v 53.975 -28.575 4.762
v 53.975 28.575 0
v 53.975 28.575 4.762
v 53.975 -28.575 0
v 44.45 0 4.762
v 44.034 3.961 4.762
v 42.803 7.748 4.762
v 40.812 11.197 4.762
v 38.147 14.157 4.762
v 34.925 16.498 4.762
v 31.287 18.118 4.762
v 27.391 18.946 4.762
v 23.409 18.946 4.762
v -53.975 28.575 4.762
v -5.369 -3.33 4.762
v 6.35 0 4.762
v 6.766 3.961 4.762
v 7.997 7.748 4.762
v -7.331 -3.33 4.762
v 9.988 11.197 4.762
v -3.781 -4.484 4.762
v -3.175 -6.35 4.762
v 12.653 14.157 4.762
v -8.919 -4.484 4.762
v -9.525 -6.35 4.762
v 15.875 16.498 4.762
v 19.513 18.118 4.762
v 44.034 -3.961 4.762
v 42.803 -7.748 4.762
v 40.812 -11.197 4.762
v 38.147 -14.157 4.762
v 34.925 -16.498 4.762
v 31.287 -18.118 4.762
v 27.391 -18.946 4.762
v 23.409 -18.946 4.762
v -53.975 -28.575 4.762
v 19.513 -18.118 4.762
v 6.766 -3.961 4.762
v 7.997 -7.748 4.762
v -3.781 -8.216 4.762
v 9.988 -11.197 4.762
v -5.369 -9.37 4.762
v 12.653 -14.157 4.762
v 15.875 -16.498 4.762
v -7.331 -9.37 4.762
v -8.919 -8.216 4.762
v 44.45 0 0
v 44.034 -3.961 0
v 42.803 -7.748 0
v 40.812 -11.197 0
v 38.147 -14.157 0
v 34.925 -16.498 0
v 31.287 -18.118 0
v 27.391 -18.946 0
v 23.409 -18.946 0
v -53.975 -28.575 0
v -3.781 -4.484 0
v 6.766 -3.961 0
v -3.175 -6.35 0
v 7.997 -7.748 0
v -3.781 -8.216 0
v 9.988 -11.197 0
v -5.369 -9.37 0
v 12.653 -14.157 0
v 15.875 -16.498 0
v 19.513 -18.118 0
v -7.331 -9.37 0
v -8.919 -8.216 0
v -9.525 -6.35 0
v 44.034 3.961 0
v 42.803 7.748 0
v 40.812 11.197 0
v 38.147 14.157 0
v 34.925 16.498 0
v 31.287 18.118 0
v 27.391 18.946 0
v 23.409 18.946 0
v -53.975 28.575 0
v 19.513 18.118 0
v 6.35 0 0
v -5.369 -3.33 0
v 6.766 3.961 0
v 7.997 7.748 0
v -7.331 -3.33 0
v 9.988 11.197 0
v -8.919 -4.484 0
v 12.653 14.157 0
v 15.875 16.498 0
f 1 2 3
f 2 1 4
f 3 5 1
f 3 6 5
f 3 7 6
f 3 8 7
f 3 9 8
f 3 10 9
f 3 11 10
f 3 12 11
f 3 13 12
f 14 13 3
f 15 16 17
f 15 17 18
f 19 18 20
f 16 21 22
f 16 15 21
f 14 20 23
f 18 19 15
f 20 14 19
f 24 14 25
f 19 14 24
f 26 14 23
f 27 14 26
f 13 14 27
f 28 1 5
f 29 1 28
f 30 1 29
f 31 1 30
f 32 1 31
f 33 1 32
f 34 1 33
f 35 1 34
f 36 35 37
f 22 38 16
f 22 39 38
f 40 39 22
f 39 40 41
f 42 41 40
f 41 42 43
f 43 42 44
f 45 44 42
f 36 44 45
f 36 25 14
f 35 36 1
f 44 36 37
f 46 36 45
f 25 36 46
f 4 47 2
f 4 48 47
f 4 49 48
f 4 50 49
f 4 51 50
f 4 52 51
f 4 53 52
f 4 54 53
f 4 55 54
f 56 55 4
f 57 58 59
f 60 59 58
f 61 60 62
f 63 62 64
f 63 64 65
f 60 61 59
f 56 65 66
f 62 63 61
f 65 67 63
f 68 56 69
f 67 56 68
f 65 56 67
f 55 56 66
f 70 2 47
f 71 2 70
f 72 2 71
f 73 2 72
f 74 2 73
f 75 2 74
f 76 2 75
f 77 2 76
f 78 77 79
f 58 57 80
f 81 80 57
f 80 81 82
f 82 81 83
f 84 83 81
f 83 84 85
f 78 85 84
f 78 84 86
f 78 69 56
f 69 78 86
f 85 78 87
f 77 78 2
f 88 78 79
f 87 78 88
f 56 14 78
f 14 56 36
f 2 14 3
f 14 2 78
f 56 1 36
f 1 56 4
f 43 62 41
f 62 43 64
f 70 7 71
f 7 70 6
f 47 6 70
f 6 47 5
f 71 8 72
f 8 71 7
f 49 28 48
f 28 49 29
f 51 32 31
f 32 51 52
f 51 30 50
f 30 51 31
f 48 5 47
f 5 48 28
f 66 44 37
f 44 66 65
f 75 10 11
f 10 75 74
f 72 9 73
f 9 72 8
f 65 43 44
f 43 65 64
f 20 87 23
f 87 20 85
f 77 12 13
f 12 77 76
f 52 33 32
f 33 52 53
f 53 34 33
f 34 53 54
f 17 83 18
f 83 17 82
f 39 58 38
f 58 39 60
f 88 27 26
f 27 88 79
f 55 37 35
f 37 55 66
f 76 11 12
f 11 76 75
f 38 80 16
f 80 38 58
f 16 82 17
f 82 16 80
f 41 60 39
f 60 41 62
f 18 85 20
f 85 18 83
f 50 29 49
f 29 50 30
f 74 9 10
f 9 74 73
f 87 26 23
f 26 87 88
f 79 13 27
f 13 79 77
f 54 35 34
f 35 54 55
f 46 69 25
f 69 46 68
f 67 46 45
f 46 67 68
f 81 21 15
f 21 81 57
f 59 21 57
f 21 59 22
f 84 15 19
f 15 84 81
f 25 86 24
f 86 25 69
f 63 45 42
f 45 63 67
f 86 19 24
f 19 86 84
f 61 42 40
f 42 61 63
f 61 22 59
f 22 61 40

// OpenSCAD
// file: measure_imperial.scad
function i2m(x)=x*25.4;

//Taps
rad_1032 = i2m(0.175 / 2);
rad_1420 = i2m(0.25 / 2);

// Gantry Tube
part_GantryTube = [i2m(3), i2m(24), i2m(1.5)];
dim_GantryTubeWall = i2m(0.125);
dim_GantryTubeHoleOffsetZ = i2m(0.75);
rad_GantryTubeHoleZ = i2m(0.5 / 2);
dim_GantryTubeHoleZEndY = i2m(2.25);
dim_GantryTubeHoleZOffsetY = i2m(3.25);
dim_GantryTubeTopHoleOffsetY = i2m(12.75);
dim_GantryTubeTopHoleOffsetX = i2m(0.375);
rad_GantryTubeTopHole = i2m(0.3125 / 2);
rad_GantryTubeMountHole = i2m(0.3125 / 2);
dim_GantryTubeMountHoleOffsetY = i2m(0.375);
dim_GantryTubeMountHoleOffsetX = i2m(0.4375);
dim_GantryTubeMountHoleGapX = i2m(2.125);
rad_GantryTubeAdjacentHole = i2m(0.375 / 2);
dim_GantryTubeAdjacentHoleOffsetY = i2m(0.375);
dim_GantryTubeAdjacentHoleOffsetX = i2m(0.4375 + 0.875);

// Common Gantry Parts
part_GantryPart1 = [i2m(7.375), i2m(0.75), i2m(0.75)];
dim_GantryPart1AdjTapHoleX = i2m(0.375);
rad_GantryPart1AdjHoles = i2m(0.375 / 2);
dim_GantryPart1AdjHolesX = i2m(0.375);
dim_GantryPart1VertHole1X = i2m(3.125);
dim_GantryPart1VertHolesY = i2m(0.375);
dim_GantryPart1VertHole2X = i2m(3.125 + 2.125);

// Gantry Bottom
rad_GantryBottomVertHoles = i2m(0.3125 / 2);

// Gantry Left Top
rad_GantryLTopMountHole = i2m( 0.250 / 2);
dim_GantryLTopCentralHoleX = i2m(4.0);

// Gantry Right Top
rad_GantryRTopBore = i2m(0.375 / 2);
dim_GantryRTopBoreX = i2m(1.25);
dim_GantryRTopTapX1 = i2m(1.875);
dim_GantryRTopTapX2 = i2m(1.875 + 3.75);
rad_GantryRTopSmall = i2m(0.25 / 2);
dim_GantryRTopSmallX1 = i2m(1.875 + 1);
dim_GantryRTopSmallX2 = i2m(1.875 + 1 + 2);

// Gantry Spacer
part_GantrySpacer = [i2m(5.625), i2m(0.75), i2m(0.125)];
rad_GantrySpacerBig = i2m(0.3125 / 2);
rad_GantrySpacerSmall = i2m(0.25 / 2);
dim_GantrySpacerBigX1 = i2m( 1 );
dim_GantrySpacerBigX2 = i2m( 1 + 3.75);
dim_GantrySpacerSmallX1 = i2m( 1 + 1);
dim_GantrySpacerSmallX2 = i2m( 1 + 1 + 2);

// Gantry Outer Right
part_GantryOuterRight = [i2m(5.625), i2m(1), i2m(0.75)];
rad_GantryOuterRightHole = i2m(0.375 / 2);
dim_GantryOuterRightHole = i2m(0.375);
rad_GantryOuterRCapsule = i2m(0.3125 / 2);
dim_GantryOuterRCapsuleX1 = i2m(2);
dim_GantryOuterRCapsuleX2 = i2m(2 + 2);
dim_GantryOuterRCapsuleLen = i2m(0.25);
dim_GantryOuterRCapsuleY = i2m(0.375);
dim_GantryOuterRCenterX1 = i2m(2.625);
dim_GantryOuterRCenterX2 = i2m(2.625 + 0.75);
rad_GantryOuterROuter = i2m(0.3125 / 2);
dim_GantryOuterROuterX1 = i2m(1);
dim_GantryOuterROuterX2 = i2m(1 + 3.75);

// Y Motor Mount Comn
part_YMotorMount = [ i2m(2.25), i2m(0.75), i2m(1.25)];
rad_YMotorMountFillet = i2m( 0.125 );
dim_YMotorMountFilletX = i2m( 0.375);
dim_YMotorMountFilletZ = i2m( 0.75);
dim_YMotorMountBoltX = i2m(0.625);
dim_YMotorMountTapY = i2m(0.303);
dim_YMotorMountTapX1 = i2m(0.1875);
dim_YMotorMountTapX2 = i2m(0.1875 + 1.856);


// X Belt Plate
part_XBeltPlate = [ i2m(1.25), i2m(1.875), i2m(0.375)];
rad_XBeltPlateBore = i2m(0.3125 / 2);
dim_XBeltPlateBoreX1 = i2m(0.25);
dim_XBeltPlateBoreX2 = i2m(0.25 + 0.75);
dim_XBeltPlateBoreY = i2m(0.625 + 0.875);
dim_XBeltPlateTapY = i2m(0.625);

// X Belt Clamp
part_XBeltClamp = [ i2m(1.25), i2m(1), i2m(0.375)];
rad_XBeltClampBore = i2m(0.3125 / 2);
dim_XBeltClampBoreY = i2m(0.625);
dim_XBeltClampChamferY = i2m(0.062);

// Timing Belt
dim_TimingBeltPeriod = i2m(0.094);
dim_TimingBeltFreq = i2m(0.20);
dim_TimingBeltAmp = i2m(0.063);

// Y Rail
part_YRail = [ i2m(22.5), i2m(2.5), i2m(0.25) ];
dim_YRailYStart = i2m(1.5);
dim_YRailYOffset = i2m(3.25);

// Carriage Block Rear Upper
part_CarriageBlockRU = [i2m(6.75), i2m(0.75), i2m(0.75)];
part_CarriageBlockRUTapX = i2m(0.375);
rad_CarriageBlockRULower = i2m(0.375 / 2);
part_CarriageBlockRULowerX = i2m(0.875);
part_CarriageBlockRULowerY = i2m(0.393);
part_CarriageBlockRUUpperY = i2m(0.25);
part_CarriageBlockRUUpperX1 = i2m(2.9375);
part_CarriageBlockRUUpperX2 = i2m(2.9375 + 0.875);
rad_CarriageBlockRU = i2m(0.375 / 2);
part_CarriageBlockRUMiddleX = i2m(1.6875);

// Carriage Block Rear Lower
part_CarriageBlockRL = [i2m(6.75), i2m(1.25), i2m(0.75)];
rad_CarriageBlockRLFillet = i2m(0.125);
part_CarriageBlockRLFilletX = i2m(1.313);
part_CarriageBlockRLFilletY = i2m(0.50);
rad_CarriageBlockRLBigHoles = i2m(0.375 / 2);
rad_CarriageBlockRLSmallHoles = i2m(0.1875 / 2);
part_CarriageBlockRLEdgeOffset = i2m(0.375);
part_CarriageBlockRLTopHoleX = i2m(1.688 - 0.188);
part_CarriageBlockRLTopHoleY = i2m(0.438);
part_CarriageBlockRLTopHoleInX = i2m(1.688 + 0.188);
part_CarriageBlockRLTopTapX = i2m(0.875);
part_CarriageBlockRLTopTapY = i2m( 0.5 + 0.375);
part_CarriageBlockRLMiddleHoleX = i2m(1.688);
part_CarriageBlockRLMiddleTapX = i2m(2.9375);
part_CarriageBlockRLMiddleTapY = i2m(0.25);


// Bearing Block
part_BearingBlock = [i2m(0.75), i2m(1), i2m(1.75)];
rad_BearingBlockBigHoles = i2m(0.375 / 2);
rad_BearingBlockSmallHoles = i2m(0.3125 / 2);
dim_BearingBlockTop = i2m(0.25);
dim_BearingBlockSideY = i2m(0.25);
dim_BearingBlockSideZ1 = i2m(0.4375);
dim_BearingBlockSideZ2 = i2m(0.4375 + 0.875);
dim_BearingBlockBackX = i2m(0.25);
dim_BearingBlockBackZ = i2m(0.1875);

// Bearing Block Tapped
dim_BearingBlockTappedBackZ = i2m(0.1875 + 0.6875);

// Carriage Block Front Right
part_CarriageBlockFrontRight = [i2m(8.5), i2m(0.75), i2m(0.75)];
rad_CarriageBlockFR = i2m(0.375 / 2);
rad_CarriageBlockFRSmall = i2m(0.3125 / 2);
dim_CarriageBlockFREdge = i2m(0.375);
dim_CarriageBlockFREdgeX = i2m(0.8125);
dim_CarriageBlockFREdgeX2 = i2m(0.8125 + 5.625);
dim_CarriageBlockFRSmallEdgeX1 = i2m(0.25);
dim_CarriageBlockFRSmallEdgeX2 = i2m(0.25 + 0.50);
dim_CarriageBlockFRTapEdgeX1 = i2m(3.438);
dim_CarriageBlockFRTapEdgeX2 = i2m(3.438 + 0.875);
dim_CarriageBlockFRTapEdgeY = i2m(0.25);
dim_CarriageBlockFRSideEdge = i2m(0.375 + 6.5);
dim_CarriageBlockFRSideMiddleX1 = i2m(1.938);
dim_CarriageBlockFRSideMiddleX2 = i2m(1.938 + 3.625);

// Carriage Block Front Left
part_CarriageBlockFrontLeft = [i2m(7.25), i2m(0.75), i2m(0.75)];
rad_CarriageBlockFL = i2m(0.375 / 2);
dim_CarriageBlockFLTEdge = i2m(0.8125);
dim_CarriageBlockFLTY = i2m(0.25);
dim_CarriageBlockFLTX1 = i2m(3.438);
dim_CarriageBlockFLTX2 = i2m(3.438 + 0.875);
dim_CarriageBlockFLSY = i2m(0.375);
dim_CarriageBlockFLSX1 = i2m(1.938);
dim_CarriageBlockFLSX2 = i2m(1.938 + 3.625);

// Spacer Upper
part_SpacerUpper = [i2m(0.75), i2m(0.75), i2m(0.75)];
rad_SpacerUpper = i2m(0.375 / 2);

// Spacer Lower
part_SpacerLower = [i2m(0.75), i2m(1.25), i2m(0.75)];
rad_SpacerLower = i2m(0.375 / 2);

// Z Motor Mount Right
part_ZMotorMountR = [i2m(2.75), i2m(0.75), i2m(1)];
rad_ZMotorMountRTop = i2m(0.25 / 2);
dim_ZMotorMountRTopY = i2m(0.197);
dim_ZMotorMountRTopX1 = i2m(0.197);
dim_ZMotorMountRTopX2 = i2m(0.197 + 1.856);
rad_ZMotorMountBore = i2m(0.625);
dim_ZMotorMountBoreY = i2m(0.375);
dim_ZMotorMountBoreX = i2m(0.197 + (1.856 / 2));
rad_ZMotorMountRSmall = i2m(0.3125 / 2);
dim_ZMotorMountSmallX = i2m(0.375);
dim_ZMotorMountSmallZ = i2m(0.25);

// Z Motor Mount Left
dim_ZMotorMountLZ = i2m(0.25);
dim_ZMotorMountLX = i2m(0.25);
dim_ZMotorMountLD = i2m(0.75);

// Z Cable Plate
part_ZCablePlate = [i2m(4.25), i2m(2.25), i2m(0.1875)];
rad_ZCablePlateBore = i2m(1.5 / 2);
dim_ZCablePlateX = i2m(1.125);
rad_ZCablePlateFillet = i2m(0.125);
dim_ZCablePlateFilletX = i2m(2.25);
dim_ZCablePlateFilletY = i2m(1.5);
// main file
include <measure_imperial.scad>

module part(part_dim){
	translate([part_dim.x * -0.5, part_dim.y * -0.5, 0])cube(part_dim);
}


ZCablePlate();

module ZCablePlate(){
	difference(){
		part(part_ZCablePlate);
		
		//bore
		translate([ part_ZCablePlate.x * 0.5 - dim_ZCablePlateX, 0, 0])cylinder(r = rad_ZCablePlateBore, h = 10, center = true);
		
		//fillet
		translate([ part_ZCablePlate.x * 0.5 - dim_ZCablePlateFilletX - rad_ZCablePlateFillet, part_ZCablePlate.y * 0.5 - dim_ZCablePlateFilletY + rad_ZCablePlateFillet ,0])cylinder(r = rad_ZCablePlateFillet, h = 10, center = true);
	}
}

module ZMotorMountL(){
	difference(){
		mirror([0,1,0])ZMotorMountR();
		
		translate([ part_ZMotorMountR.x * 0.5 + 1, part_ZMotorMountR.y * 0.5 - dim_ZMotorMountLX, dim_ZMotorMountLZ])rotate([ 0, -90, 0])cylinder(r=rad_1032,h=dim_ZMotorMountLD+1);
		translate([ part_ZMotorMountR.x * 0.5 + 1, part_ZMotorMountR.y * 0.5 - dim_ZMotorMountLX, part_ZMotorMountR.z - dim_ZMotorMountLZ])rotate([ 0, -90, 0])cylinder(r=rad_1032,h=dim_ZMotorMountLD+1);
	}
}

module ZMotorMountR(){
	difference(){
		part(part_ZMotorMountR);
		
		// Top
		translate([ part_ZMotorMountR.x * 0.5 - dim_ZMotorMountRTopX1, part_ZMotorMountR.y * 0.5 - dim_ZMotorMountRTopX1, 0])cylinder(r = rad_ZMotorMountRTop, h = 100, center = true);
		translate([ part_ZMotorMountR.x * 0.5 - dim_ZMotorMountRTopX2, part_ZMotorMountR.y * 0.5 - dim_ZMotorMountRTopX1, 0])cylinder(r = rad_ZMotorMountRTop, h = 100, center = true);
		
		//Bore
		translate([ part_ZMotorMountR.x * 0.5 - dim_ZMotorMountBoreX , part_ZMotorMountR.y * -0.5 - dim_ZMotorMountBoreY, 0])cylinder(r = rad_ZMotorMountBore, h = 100, center = true);
		
		//Side
		translate([ part_ZMotorMountR.x * -0.5 + dim_ZMotorMountSmallX, 0, dim_ZMotorMountSmallZ ])rotate([ 90, 0, 0])cylinder(r = rad_ZMotorMountRSmall, h = 100, center = true);
		translate([ part_ZMotorMountR.x * -0.5 + dim_ZMotorMountSmallX, 0, part_ZMotorMountR.z - dim_ZMotorMountSmallZ ])rotate([ 90, 0, 0])cylinder(r = rad_ZMotorMountRSmall, h = 100, center = true);
		
	}
}

module SpacerLower(){
	difference(){
		part(part_SpacerLower);
		cylinder(r= rad_SpacerLower, h=100,center=true);
	}
}

module SpacerUpper(){
	difference(){
		part(part_SpacerUpper);
		cylinder(r= rad_SpacerUpper, h=100,center=true);
	}
}

module CarriageBlockFrontLeft(){
	difference(){
		part(part_CarriageBlockFrontLeft);
		
		// Top
		translate([ part_CarriageBlockFrontLeft.x * -0.5 + dim_CarriageBlockFLTEdge, 0, part_CarriageBlockFrontLeft.z * 0.5])tappedHole(rad_CarriageBlockFL, rad_1032);
		translate([ part_CarriageBlockFrontLeft.x * 0.5 - dim_CarriageBlockFLTEdge, 0, part_CarriageBlockFrontLeft.z * 0.5])tappedHole(rad_CarriageBlockFL, rad_1032);
		translate([ part_CarriageBlockFrontLeft.x * -0.5 + dim_CarriageBlockFLTX1, part_CarriageBlockFrontLeft.y * -0.5 + dim_CarriageBlockFLTY, 0])cylinder(r = rad_1420, h=100, center=true);
		translate([ part_CarriageBlockFrontLeft.x * 0.5 - dim_CarriageBlockFLTX1, part_CarriageBlockFrontLeft.y * -0.5 + dim_CarriageBlockFLTY, 0])cylinder(r = rad_1420, h=100, center=true);

		// Front
		translate([ part_CarriageBlockFrontLeft.x * -0.5 + dim_CarriageBlockFLSY, 0, part_CarriageBlockFrontLeft.z * 0.5])rotate([ -90, 0, 0])tappedHole(rad_CarriageBlockFL, rad_1032);
		translate([ part_CarriageBlockFrontLeft.x * 0.5 - dim_CarriageBlockFLSY, 0, part_CarriageBlockFrontLeft.z * 0.5])rotate([ -90, 0, 0])tappedHole(rad_CarriageBlockFL, rad_1032);
		translate([ part_CarriageBlockFrontLeft.x * -0.5 + dim_CarriageBlockFLSX1, 0, part_CarriageBlockFrontLeft.z * 0.5])rotate([ -90, 0, 0])cylinder(r=rad_CarriageBlockFL, h=100, center=true);
		translate([ part_CarriageBlockFrontLeft.x * -0.5 + dim_CarriageBlockFLSX2, 0, part_CarriageBlockFrontLeft.z * 0.5])rotate([ -90, 0, 0])cylinder(r=rad_CarriageBlockFL, h=100, center=true);

	}
}

module tappedHole(oR, tR){
	cylinder(r = oR, h = 100, center=true);
	rotate([90, 0, 0])cylinder(r = tR, h = 50);
}

module CarriageBlockFrontRight(){
	difference(){
		part(part_CarriageBlockFrontRight);
		
		//Top Tapped Bore
		translate([ part_CarriageBlockFrontRight.x * -0.5 + dim_CarriageBlockFREdgeX, 0, part_CarriageBlockFrontRight.z * 0.5])tappedHole(rad_CarriageBlockFR, rad_1032);
		translate([ part_CarriageBlockFrontRight.x * -0.5 + dim_CarriageBlockFREdgeX2, 0, part_CarriageBlockFrontRight.z * 0.5])tappedHole(rad_CarriageBlockFR, rad_1032);

		translate([ part_CarriageBlockFrontRight.x * 0.5 - dim_CarriageBlockFRSmallEdgeX1, 0, 0])cylinder(r=rad_CarriageBlockFRSmall, h = 100, center=true);
		translate([ part_CarriageBlockFrontRight.x * 0.5 - dim_CarriageBlockFRSmallEdgeX2, 0, 0])cylinder(r=rad_CarriageBlockFRSmall, h = 100, center=true);
		
		translate([ part_CarriageBlockFrontRight.x * -0.5 + dim_CarriageBlockFRTapEdgeX1, part_CarriageBlockFrontRight.y * -0.5 + dim_CarriageBlockFRTapEdgeY, 0])cylinder(r=rad_1420, h = 100, center=true);
		translate([ part_CarriageBlockFrontRight.x * -0.5 + dim_CarriageBlockFRTapEdgeX2, part_CarriageBlockFrontRight.y * -0.5 + dim_CarriageBlockFRTapEdgeY, 0])cylinder(r=rad_1420, h = 100, center=true);


		// Side tapped hole
		translate([ part_CarriageBlockFrontRight.x * -0.5 + dim_CarriageBlockFREdge, 0, part_CarriageBlockFrontRight.z * 0.5])rotate([90, 0, 0])tappedHole(rad_CarriageBlockFR, rad_1032);
		translate([ part_CarriageBlockFrontRight.x * -0.5 + dim_CarriageBlockFRSideEdge, 0, part_CarriageBlockFrontRight.z * 0.5])rotate([90, 0, 0])tappedHole(rad_CarriageBlockFR, rad_1032);
		
		translate([ part_CarriageBlockFrontRight.x * -0.5 + dim_CarriageBlockFRSideMiddleX1, 0, part_CarriageBlockFrontRight.z * 0.5])rotate([ 90, 0, 0])cylinder(r=rad_CarriageBlockFR, h=100, center=true);
		translate([ part_CarriageBlockFrontRight.x * -0.5 + dim_CarriageBlockFRSideMiddleX2, 0, part_CarriageBlockFrontRight.z * 0.5])rotate([ 90, 0, 0])cylinder(r=rad_CarriageBlockFR, h=100, center=true);
		
		
	}
}

module BearingBlockTapped(){
	difference(){
		BearingBlock();
		
		//Tap
		translate([ part_BearingBlock.x * 0.5 - dim_BearingBlockBackX, part_BearingBlock.y * 0.5 + 1, part_BearingBlock.z - dim_BearingBlockTappedBackZ])rotate([ 90, 0, 0])cylinder(r = rad_1420, h = part_BearingBlock.y + 2);

	}
}

module BearingBlock(){
	difference(){
		part(part_BearingBlock);
		
		// TOP
		translate([ part_BearingBlock.x * 0.5 - dim_BearingBlockTop, part_BearingBlock.y * 0.5 - dim_BearingBlockTop, -1])cylinder(r = rad_BearingBlockBigHoles, h = part_BearingBlock.z + 2);
		
		//Side
		translate([ part_BearingBlock.x * -0.5 - 1, part_BearingBlock.y * -0.5 + dim_BearingBlockSideY, part_BearingBlock.z - dim_BearingBlockSideZ1])rotate([ 0, 90, 0])cylinder(r = rad_BearingBlockSmallHoles, h = part_BearingBlock.x + 2);
		translate([ part_BearingBlock.x * -0.5 - 1, part_BearingBlock.y * -0.5 + dim_BearingBlockSideY, part_BearingBlock.z - dim_BearingBlockSideZ2])rotate([ 0, 90, 0])cylinder(r = rad_BearingBlockSmallHoles, h = part_BearingBlock.x + 2);

		//Back
		translate([ part_BearingBlock.x * 0.5 - dim_BearingBlockBackX, part_BearingBlock.y * 0.5 + 1, part_BearingBlock.z - dim_BearingBlockBackZ])rotate([ 90, 0, 0])cylinder(r = rad_1032, h = part_BearingBlock.y + 2);
		translate([ part_BearingBlock.x * 0.5 - dim_BearingBlockBackX, part_BearingBlock.y * 0.5 + 1, dim_BearingBlockBackZ])rotate([ 90, 0, 0])cylinder(r = rad_1032, h = part_BearingBlock.y + 2);


	}
}

module CarriageBlockRL(){
	difference(){
		part(part_CarriageBlockRL);
		
		//Left Fillet
		translate([ part_CarriageBlockRL.x * -0.5 + part_CarriageBlockRLFilletX - rad_CarriageBlockRLFillet, part_CarriageBlockRL.y * -0.5 + part_CarriageBlockRLFilletY - rad_CarriageBlockRLFillet, -1])cylinder(r = rad_CarriageBlockRLFillet, h = part_CarriageBlockRL.z + 2);
		translate([ part_CarriageBlockRL.x * -0.5 - 1, part_CarriageBlockRL.y * -0.5 - 1, -1])cube([ part_CarriageBlockRLFilletX + 1 - rad_CarriageBlockRLFillet, part_CarriageBlockRLFilletY + 1, part_CarriageBlockRL.z + 2]);
		translate([ part_CarriageBlockRL.x * -0.5 - 1, part_CarriageBlockRL.y * -0.5 - 1, -1])cube([ part_CarriageBlockRLFilletX + 1, part_CarriageBlockRLFilletY + 1 - rad_CarriageBlockRLFillet, part_CarriageBlockRL.z + 2]);
		
		//Right Fillet
		mirror([ 1, 0, 0]){
			translate([ part_CarriageBlockRL.x * -0.5 + part_CarriageBlockRLFilletX - rad_CarriageBlockRLFillet, part_CarriageBlockRL.y * -0.5 + part_CarriageBlockRLFilletY - rad_CarriageBlockRLFillet, -1])cylinder(r = rad_CarriageBlockRLFillet, h = part_CarriageBlockRL.z + 2);
			translate([ part_CarriageBlockRL.x * -0.5 - 1, part_CarriageBlockRL.y * -0.5 - 1, -1])cube([ part_CarriageBlockRLFilletX + 1 - rad_CarriageBlockRLFillet, part_CarriageBlockRLFilletY + 1, part_CarriageBlockRL.z + 2]);
			translate([ part_CarriageBlockRL.x * -0.5 - 1, part_CarriageBlockRL.y * -0.5 - 1, -1])cube([ part_CarriageBlockRLFilletX + 1, part_CarriageBlockRLFilletY + 1 - rad_CarriageBlockRLFillet, part_CarriageBlockRL.z + 2]);
		}
		
		// Edge holes
		translate([ part_CarriageBlockRL.x * -0.5 + part_CarriageBlockRLEdgeOffset, part_CarriageBlockRL.y * 0.5 - part_CarriageBlockRLEdgeOffset, -1])cylinder(r = rad_CarriageBlockRLBigHoles, h = part_CarriageBlockRL.z + 2);
		translate([ part_CarriageBlockRL.x * 0.5 - part_CarriageBlockRLEdgeOffset, part_CarriageBlockRL.y * 0.5 - part_CarriageBlockRLEdgeOffset, -1])cylinder(r = rad_CarriageBlockRLBigHoles, h = part_CarriageBlockRL.z + 2);

		// Middle holes
		translate([ part_CarriageBlockRL.x * -0.5 + part_CarriageBlockRLMiddleHoleX, 0, -1])cylinder(r = rad_CarriageBlockRLBigHoles, h = part_CarriageBlockRL.z + 2);
		translate([ part_CarriageBlockRL.x * 0.5 - part_CarriageBlockRLMiddleHoleX, 0, -1])cylinder(r = rad_CarriageBlockRLBigHoles, h = part_CarriageBlockRL.z + 2);

		// Top Small holes
		translate([ part_CarriageBlockRL.x * -0.5 + part_CarriageBlockRLTopHoleX, part_CarriageBlockRLTopHoleY, -1])cylinder(r = rad_CarriageBlockRLSmallHoles, h = part_CarriageBlockRL.z + 2);
		translate([ part_CarriageBlockRL.x * 0.5 - part_CarriageBlockRLTopHoleX, part_CarriageBlockRLTopHoleY, -1])cylinder(r = rad_CarriageBlockRLSmallHoles, h = part_CarriageBlockRL.z + 2);

		// Top Small holes
		translate([ part_CarriageBlockRL.x * -0.5 + part_CarriageBlockRLTopHoleInX, part_CarriageBlockRLTopHoleY * -1, -1])cylinder(r = rad_CarriageBlockRLSmallHoles, h = part_CarriageBlockRL.z + 2);
		translate([ part_CarriageBlockRL.x * 0.5 - part_CarriageBlockRLTopHoleInX, part_CarriageBlockRLTopHoleY * -1, -1])cylinder(r = rad_CarriageBlockRLSmallHoles, h = part_CarriageBlockRL.z + 2);


		// Top tap holes
		translate([ part_CarriageBlockRL.x * -0.5 + part_CarriageBlockRLTopTapX, part_CarriageBlockRL.y * -0.5 + part_CarriageBlockRLTopTapY, -1])cylinder(r = rad_1032, h = part_CarriageBlockRL.z * 0.5);
		translate([ part_CarriageBlockRL.x * 0.5 - part_CarriageBlockRLTopTapX, part_CarriageBlockRL.y * -0.5 + part_CarriageBlockRLTopTapY, -1])cylinder(r = rad_1032, h = part_CarriageBlockRL.z * 0.5);

		//Side holes
		translate([ 0, part_CarriageBlockRL.y * -0.5 - 1 ,0])rotate([ -90, 0, 0]){
			// tap holes
			translate([ part_CarriageBlockRL.x * -0.5 + part_CarriageBlockRLEdgeOffset, part_CarriageBlockRLEdgeOffset * -1, part_CarriageBlockRLEdgeOffset * -1])cylinder(r = rad_1032, h = part_CarriageBlockRL.y + 2);
			translate([ part_CarriageBlockRL.x * 0.5 - part_CarriageBlockRLEdgeOffset, part_CarriageBlockRLEdgeOffset * -1, part_CarriageBlockRLEdgeOffset * -1])cylinder(r = rad_1032, h = part_CarriageBlockRL.y + 2);
		
			//Outer holes
			translate([ part_CarriageBlockRL.x * -0.5 + part_CarriageBlockRLTopTapX, part_CarriageBlockRL.z * -0.5, 0])cylinder (r = rad_CarriageBlockRLBigHoles, h = part_CarriageBlockRL.y + 2);
			translate([ part_CarriageBlockRL.x * 0.5 - part_CarriageBlockRLTopTapX, part_CarriageBlockRL.z * -0.5, 0])cylinder (r = rad_CarriageBlockRLBigHoles, h = part_CarriageBlockRL.y + 2);
			
			//Middle Tap holes
			translate([ part_CarriageBlockRL.x * -0.5 + part_CarriageBlockRLMiddleTapX, part_CarriageBlockRLMiddleTapY * -1, 0])cylinder (r = rad_1420, h = part_CarriageBlockRL.y + 2);
			translate([ part_CarriageBlockRL.x * 0.5 - part_CarriageBlockRLMiddleTapX, part_CarriageBlockRLMiddleTapY * -1, 0])cylinder (r = rad_1420, h = part_CarriageBlockRL.y + 2);

		}

	}
}

module CarriageBlockRU(){
	difference(){
		part(part_CarriageBlockRU);
		
		// Edge taps
		translate([ part_CarriageBlockRU.x * -0.5 + part_CarriageBlockRUTapX, 0, -1])cylinder( r = rad_1032, h = part_CarriageBlockRU.z + 2);
		translate([ part_CarriageBlockRU.x * 0.5 - part_CarriageBlockRUTapX, 0, -1])cylinder( r = rad_1032, h = part_CarriageBlockRU.z + 2);

		// Lower holes		
		translate([ part_CarriageBlockRU.x * -0.5 + part_CarriageBlockRULowerX, part_CarriageBlockRU.y * 0.5 - part_CarriageBlockRULowerY, -1])cylinder( r = rad_CarriageBlockRULower, h = part_CarriageBlockRU.z + 2);
		translate([ part_CarriageBlockRU.x * 0.5 - part_CarriageBlockRULowerX, part_CarriageBlockRU.y * 0.5 - part_CarriageBlockRULowerY, -1])cylinder( r = rad_CarriageBlockRULower, h = part_CarriageBlockRU.z + 2);

		// Upper holes		
		translate([ part_CarriageBlockRU.x * 0.5 - part_CarriageBlockRUUpperX1, part_CarriageBlockRU.y * 0.5 - part_CarriageBlockRUUpperY, -1])cylinder( r = rad_1420, h = part_CarriageBlockRU.z + 2);
		translate([ part_CarriageBlockRU.x * 0.5 - part_CarriageBlockRUUpperX2, part_CarriageBlockRU.y * 0.5 - part_CarriageBlockRUUpperY, -1])cylinder( r = rad_1420, h = part_CarriageBlockRU.z + 2);

		// Edge holes
		translate([ 0, part_CarriageBlockRU.y * 0.5 + 1, part_CarriageBlockRU.z * 0.5])rotate([90,0,0]){
			translate([ part_CarriageBlockRU.x * -0.5 + part_CarriageBlockRUTapX, -1, 0])cylinder( r = rad_CarriageBlockRU, h = part_CarriageBlockRU.y + 2);
			translate([ part_CarriageBlockRU.x * 0.5 - part_CarriageBlockRUTapX, 1, 0])cylinder( r = rad_CarriageBlockRU, h = part_CarriageBlockRU.y + 2);
		}

		// Lower taps
		translate([ 0, 0, part_CarriageBlockRU.z * 0.5])rotate([-90,0,0]){
			translate([ part_CarriageBlockRU.x * -0.5 + part_CarriageBlockRULowerX, part_CarriageBlockRU.y * 0.5 - part_CarriageBlockRULowerY, -1])cylinder( r = rad_1032, h = part_CarriageBlockRU.z + 2);
			translate([ part_CarriageBlockRU.x * 0.5 - part_CarriageBlockRULowerX, part_CarriageBlockRU.y * 0.5 - part_CarriageBlockRULowerY, -1])cylinder( r = rad_1032, h = part_CarriageBlockRU.z + 2);
		}
		
		// Middle holes
		translate([ 0, part_CarriageBlockRU.y * 0.5 + 1, part_CarriageBlockRU.z * 0.5])rotate([90,0,0]){
			translate([ part_CarriageBlockRU.x * -0.5 + part_CarriageBlockRUMiddleX, -1, 0])cylinder( r = rad_CarriageBlockRU, h = part_CarriageBlockRU.y + 2);
			translate([ part_CarriageBlockRU.x * 0.5 - part_CarriageBlockRUMiddleX, 1, 0])cylinder( r = rad_CarriageBlockRU, h = part_CarriageBlockRU.y + 2);
		}
	}
}

module YRail(){
	difference(){
		part(part_YRail);
		for(hole = [0:6]){
			translate([ part_YRail.x * 0.5 - dim_YRailYStart -( hole * dim_YRailYOffset), 0, -1])cylinder(r = rad_1420, h = part_YRail.z + 2);
		}
	}
}


module TimingBelt(){
	translate([ -4.75 * dim_TimingBeltFreq, 0, 0])
	for(tooth = [0:10]){
		translate([ tooth * dim_TimingBeltFreq, 0, i2m(-1.5)])cube([ dim_TimingBeltPeriod, dim_TimingBeltAmp, i2m(3)]);
	}
}

module XBeltClamp(){
	difference(){
		part(part_XBeltClamp);
		
		// Bore
		translate([ 0, part_XBeltClamp.y * -0.5 + dim_XBeltClampBoreY, -1])cylinder(r = rad_XBeltClampBore, h = part_XBeltClamp.z + 2);
		
		// Left Chamfer
		translate([ part_XBeltClamp.x * -0.5, part_XBeltClamp.y * -0.5 - 1, part_XBeltClamp.z - dim_XBeltClampChamferY])mirror([0 ,0 ,1])rotate([ 0, -45, 0])cube([ part_XBeltClamp.x, part_XBeltClamp.y + 2, part_XBeltClamp.z]);

		// Right Chamfer
		translate([ part_XBeltClamp.x * 0.5, part_XBeltClamp.y * -0.5 - 1, part_XBeltClamp.z - dim_XBeltClampChamferY])rotate([ 0, -45, 0])translate([ part_XBeltClamp.x * -1, 0, part_XBeltClamp.z * -1])cube([ part_XBeltClamp.x, part_XBeltClamp.y + 2, part_XBeltClamp.z]);

		translate([ 0, 0, part_XBeltClamp.z + 0.05])rotate([ -90, 0, 0])TimingBelt();
	
	}
}

module XBeltPlate(){
	difference(){
		part(part_XBeltPlate);
		
		//Right Bore
		translate([ part_XBeltPlate.x * -0.5 + dim_XBeltPlateBoreX1, part_XBeltPlate.y * -0.5 + dim_XBeltPlateBoreY, -1])cylinder( r = rad_XBeltPlateBore, h = part_XBeltPlate.z + 2);

		//Left Bore
		translate([ part_XBeltPlate.x * -0.5 + dim_XBeltPlateBoreX2, part_XBeltPlate.y * -0.5 + dim_XBeltPlateBoreY, -1])cylinder( r = rad_XBeltPlateBore, h = part_XBeltPlate.z + 2);

		//Tap Bore
		translate([ 0, part_XBeltPlate.y * -0.5 + dim_XBeltPlateTapY, -1])cylinder( r = rad_1420, h = part_XBeltPlate.z + 2);


	}
}

module YMotorMountRear(){
	mirror([ 0, 1, 0])YMotorMountFront();
}

module YMotorMountFront(){
	difference(){

		part(part_YMotorMount);
		
		// basic shape
		translate([ part_YMotorMount.x * -0.5 + dim_YMotorMountFilletX - rad_YMotorMountFillet, part_YMotorMount.y * 0.5 + 1, dim_YMotorMountFilletZ - rad_YMotorMountFillet])rotate([ 90, 0, 0])cylinder(r = rad_YMotorMountFillet, h = part_YMotorMount.y + 2);
		translate([ part_YMotorMount.x * -0.5 -1, part_YMotorMount.y * -0.5 -1, -1])cube([ dim_YMotorMountFilletX + 1 - rad_YMotorMountFillet, part_YMotorMount.y + 2, dim_YMotorMountFilletZ + 1]);
		translate([ part_YMotorMount.x * -0.5 -1, part_YMotorMount.y * -0.5 -1, -1])cube([ dim_YMotorMountFilletX + 1, part_YMotorMount.y + 2, dim_YMotorMountFilletZ + 1 - rad_YMotorMountFillet]);

		// bolt hole
		translate([ part_YMotorMount.x * 0.5 - dim_YMotorMountBoltX, 0, -1])cylinder( r = rad_1420, h = part_YMotorMount.z + 2);


		// nema taps
		translate([ part_YMotorMount.x * 0.5 - dim_YMotorMountTapX1, part_YMotorMount.y * 0.5 - dim_YMotorMountTapY, -1])cylinder(r = rad_1032, h = part_YMotorMount.z + 2);
		translate([ part_YMotorMount.x * 0.5 - dim_YMotorMountTapX2, part_YMotorMount.y * 0.5 - dim_YMotorMountTapY, -1])cylinder(r = rad_1032, h = part_YMotorMount.z + 2);
	}
}


module GantryOuterRight(){
	difference(){
		part(part_GantryOuterRight);
		
		// Right hole
		translate([ part_GantryOuterRight.x * 0.5 - dim_GantryOuterRightHole, part_GantryOuterRight.y * -0.5 + dim_GantryOuterRightHole, -1])cylinder(r = rad_GantryOuterRightHole, h = part_GantryOuterRight.z + 2);
		// Right tap hole
		translate([ part_GantryOuterRight.x * 0.5 - dim_GantryOuterRightHole, 0, part_GantryOuterRight.z * 0.5])rotate([ 90, 0, 0])cylinder( r = rad_1032, h = part_GantryOuterRight.y * 0.5 + 1);

		// Left hole
		translate([ part_GantryOuterRight.x * -0.5 + dim_GantryOuterRightHole, part_GantryOuterRight.y * -0.5 + dim_GantryOuterRightHole, -1])cylinder(r = rad_GantryOuterRightHole, h = part_GantryOuterRight.z + 2);
		// Leftt tap hole
		translate([ part_GantryOuterRight.x * -0.5 + dim_GantryOuterRightHole, 0, part_GantryOuterRight.z * 0.5])rotate([ 90, 0, 0])cylinder( r = rad_1032, h = part_GantryOuterRight.y * 0.5 + 1);


		// Right adjust hole
		translate([ part_GantryOuterRight.x * 0.5 - dim_GantryOuterRCapsuleX1, part_GantryOuterRight.y * -0.5 + dim_GantryOuterRCapsuleY, -1]){
			hull(){
				cylinder(r = rad_GantryOuterRCapsule, h = part_GantryOuterRight.z + 2);
				translate([ 0, dim_GantryOuterRCapsuleLen, 0])cylinder(r = rad_GantryOuterRCapsule, h = part_GantryOuterRight.z + 2);
			}
		}
		// Right adjust tap hole
		translate([ part_GantryOuterRight.x * 0.5 - dim_GantryOuterRCapsuleX1, 0, part_GantryOuterRight.z * 0.5])rotate([ -90, 0, 0])cylinder( r = rad_1032, h = part_GantryOuterRight.y * 0.5 + 1);
		
		
		// Left adjust hole
		translate([ part_GantryOuterRight.x * 0.5 - dim_GantryOuterRCapsuleX2, part_GantryOuterRight.y * -0.5 + dim_GantryOuterRCapsuleY, -1]){
			hull(){
				cylinder(r = rad_GantryOuterRCapsule, h = part_GantryOuterRight.z + 2);
				translate([ 0, dim_GantryOuterRCapsuleLen, 0])cylinder(r = rad_GantryOuterRCapsule, h = part_GantryOuterRight.z + 2);
			}
		}
		// Left adjust tap hole
		translate([ part_GantryOuterRight.x * 0.5 - dim_GantryOuterRCapsuleX2, 0, part_GantryOuterRight.z * 0.5])rotate([ -90, 0, 0])cylinder( r = rad_1032, h = part_GantryOuterRight.y * 0.5 + 1);
		
		// Right center hole
		translate([ part_GantryOuterRight.x * 0.5 - dim_GantryOuterRCenterX1, 0, part_GantryOuterRight.z * 0.5])rotate([ -90, 0, 0])cylinder( r = rad_1420, h = part_GantryOuterRight.y * 0.5 + 1);
		
		// Left center hole
		translate([ part_GantryOuterRight.x * 0.5 - dim_GantryOuterRCenterX2, 0, part_GantryOuterRight.z * 0.5])rotate([ -90, 0, 0])cylinder( r = rad_1420, h = part_GantryOuterRight.y * 0.5 + 1);
		
		// Right outer hole
		translate([ part_GantryOuterRight.x * 0.5 - dim_GantryOuterROuterX1, 0, part_GantryOuterRight.z * 0.5])rotate([ -90, 0, 0])cylinder( r = rad_GantryOuterROuter, h = part_GantryOuterRight.y * 0.5 + 1);
		
		// Left outer hole
		translate([ part_GantryOuterRight.x * 0.5 - dim_GantryOuterROuterX2, 0, part_GantryOuterRight.z * 0.5])rotate([ -90, 0, 0])cylinder( r = rad_GantryOuterROuter, h = part_GantryOuterRight.y * 0.5 + 1);
		
		
	}
}

module GantrySpacer(){
	difference(){
		part(part_GantrySpacer);
		
		// Right Big Hole
		translate([ part_GantrySpacer.x * 0.5 - dim_GantrySpacerBigX1, 0, -1])cylinder(r = rad_GantrySpacerBig, h = part_GantrySpacer.z + 2);

		// Left Big Hole
		translate([ part_GantrySpacer.x * 0.5 - dim_GantrySpacerBigX2, 0, -1])cylinder(r = rad_GantrySpacerBig, h = part_GantrySpacer.z + 2);

		// Right Small Hole
		translate([ part_GantrySpacer.x * 0.5 - dim_GantrySpacerSmallX1, 0, -1])cylinder(r = rad_GantrySpacerSmall, h = part_GantrySpacer.z + 2);

		// Left Small Hole
		translate([ part_GantrySpacer.x * 0.5 - dim_GantrySpacerSmallX2, 0, -1])cylinder(r = rad_GantrySpacerSmall, h = part_GantrySpacer.z + 2);

	}
}

module GantryRTop(){
	difference(){
		part(part_GantryPart1);
		
		// Right adj tap hole
		translate([ part_GantryPart1.x * 0.5 - dim_GantryPart1AdjTapHoleX, 0, -1])cylinder(r = rad_1032, h = part_GantryPart1.z * 0.5 + 1);

		// Left adj tap hole
		translate([ part_GantryPart1.x * -0.5 + dim_GantryPart1AdjTapHoleX, 0, -1])cylinder(r = rad_1032, h = part_GantryPart1.z * 0.5 + 1);

		// Right adj hole
		translate([ part_GantryPart1.x * -0.5 + dim_GantryPart1AdjHolesX, part_GantryPart1.y * 0.5 + 1 , part_GantryPart1.z * 0.5])rotate([90, 0, 0])cylinder(r = rad_GantryPart1AdjHoles, h = part_GantryPart1.y + 2);

		// Left adj hole
		translate([ part_GantryPart1.x * 0.5 - dim_GantryPart1AdjHolesX, part_GantryPart1.y * 0.5 + 1 , part_GantryPart1.z * 0.5])rotate([90, 0, 0])cylinder(r = rad_GantryPart1AdjHoles, h = part_GantryPart1.y + 2);

		// Right Hole
		translate([ part_GantryPart1.x * 0.5 - dim_GantryPart1VertHole1X, 0, -1])cylinder(r = rad_GantryLTopMountHole, h = part_GantryPart1.z + 2);

		// Left Hole
		translate([ part_GantryPart1.x * 0.5 - dim_GantryPart1VertHole2X, 0, -1])cylinder(r = rad_GantryLTopMountHole, h = part_GantryPart1.z + 2);

		// Left Bore Hole
		translate([ part_GantryPart1.x * 0.5 - dim_GantryRTopBoreX, 0, -1])cylinder(r = rad_GantryRTopBore, h = part_GantryPart1.z + 2);
		// Left Bore Tap
		translate([ part_GantryPart1.x * 0.5 - dim_GantryRTopBoreX, 1, part_GantryPart1.z * 0.5])rotate([ -90, 0, 0])cylinder(r = rad_1032, h = part_GantryPart1.y * 0.5);
		
		// Right Bore Hole
		translate([ part_GantryPart1.x * -0.5 + dim_GantryRTopBoreX, 0, -1])cylinder(r = rad_GantryRTopBore, h = part_GantryPart1.z + 2);
		// Right Bore Tap
		translate([ part_GantryPart1.x * -0.5 + dim_GantryRTopBoreX, 1, part_GantryPart1.z * 0.5])rotate([ -90, 0, 0])cylinder(r = rad_1032, h = part_GantryPart1.y * 0.5);


		// Right 1/4 Tap
		translate([ part_GantryPart1.x * 0.5 - dim_GantryRTopTapX1, part_GantryPart1.y * -0.5 - 1, part_GantryPart1.z * 0.5])rotate([ -90, 0, 0])cylinder(r = rad_1420, h = part_GantryPart1.y + 2);

		// Left 1/4 Tap
		translate([ part_GantryPart1.x * 0.5 - dim_GantryRTopTapX2, part_GantryPart1.y * -0.5 - 1, part_GantryPart1.z * 0.5])rotate([ -90, 0, 0])cylinder(r = rad_1420, h = part_GantryPart1.y + 2);


		// Right Small Hole
		translate([ part_GantryPart1.x * 0.5 - dim_GantryRTopSmallX1, part_GantryPart1.y * -0.5 - 1, part_GantryPart1.z * 0.5])rotate([ -90, 0, 0])cylinder(r = rad_GantryRTopSmall, h = part_GantryPart1.y + 2);

		// Left Small Hole
		translate([ part_GantryPart1.x * 0.5 - dim_GantryRTopSmallX2, part_GantryPart1.y * -0.5 - 1, part_GantryPart1.z * 0.5])rotate([ -90, 0, 0])cylinder(r = rad_GantryRTopSmall, h = part_GantryPart1.y + 2);


	}
}

module GantryLTop(){

	difference(){
		part(part_GantryPart1);
		
		// Right adj tap hole
		translate([ part_GantryPart1.x * 0.5 - dim_GantryPart1AdjTapHoleX, 0, -1])cylinder(r = rad_1032, h = part_GantryPart1.z * 0.5 + 1);

		// Left adj tap hole
		translate([ part_GantryPart1.x * -0.5 + dim_GantryPart1AdjTapHoleX, 0, -1])cylinder(r = rad_1032, h = part_GantryPart1.z * 0.5 + 1);

		// Right adj hole
		translate([ part_GantryPart1.x * -0.5 + dim_GantryPart1AdjHolesX, part_GantryPart1.y * 0.5 + 1 , part_GantryPart1.z * 0.5])rotate([90, 0, 0])cylinder(r = rad_GantryPart1AdjHoles, h = part_GantryPart1.y + 2);

		// Left adj hole
		translate([ part_GantryPart1.x * 0.5 - dim_GantryPart1AdjHolesX, part_GantryPart1.y * 0.5 + 1 , part_GantryPart1.z * 0.5])rotate([90, 0, 0])cylinder(r = rad_GantryPart1AdjHoles, h = part_GantryPart1.y + 2);

		// Right Hole
		translate([ part_GantryPart1.x * 0.5 - dim_GantryPart1VertHole1X, 0, -1])cylinder(r = rad_GantryLTopMountHole, h = part_GantryPart1.z + 2);

		// Left Hole
		translate([ part_GantryPart1.x * 0.5 - dim_GantryPart1VertHole2X, 0, -1])cylinder(r = rad_GantryLTopMountHole, h = part_GantryPart1.z + 2);

		// Central Hole
		translate([ part_GantryPart1.x * 0.5 - dim_GantryLTopCentralHoleX, 0, -1])cylinder(r = rad_GantryPart1AdjHoles, h = part_GantryPart1.z + 2);

	}

}

module GantryBottom(){
	difference(){
		part(part_GantryPart1);
		
		// Right Hole
		translate([ part_GantryPart1.x * 0.5 - dim_GantryPart1VertHole1X, 0, -1])cylinder(r = rad_GantryBottomVertHoles, h = part_GantryPart1.z + 2);

		// Left Hole
		translate([ part_GantryPart1.x * 0.5 - dim_GantryPart1VertHole2X, 0, -1])cylinder(r = rad_GantryBottomVertHoles, h = part_GantryPart1.z + 2);

		// Right adj tap hole
		translate([ part_GantryPart1.x * 0.5 - dim_GantryPart1AdjTapHoleX, 0, -1])cylinder(r = rad_1032, h = part_GantryPart1.z * 0.5 + 1);

		// Left adj tap hole
		translate([ part_GantryPart1.x * -0.5 + dim_GantryPart1AdjTapHoleX, 0, -1])cylinder(r = rad_1032, h = part_GantryPart1.z * 0.5 + 1);

		// Right adj hole
		translate([ part_GantryPart1.x * -0.5 + dim_GantryPart1AdjHolesX, part_GantryPart1.y * 0.5 + 1 , part_GantryPart1.z * 0.5])rotate([90, 0, 0])cylinder(r = rad_GantryPart1AdjHoles, h = part_GantryPart1.y + 2);

		// Left adj hole
		translate([ part_GantryPart1.x * 0.5 - dim_GantryPart1AdjHolesX, part_GantryPart1.y * 0.5 + 1 , part_GantryPart1.z * 0.5])rotate([90, 0, 0])cylinder(r = rad_GantryPart1AdjHoles, h = part_GantryPart1.y + 2);


	}
}

module GantryTube(){
	difference(){
		
		// tube outer
		part(part_GantryTube);
		
		// tube inner
		translate([0, 0, dim_GantryTubeWall])part([part_GantryTube.x - 2*dim_GantryTubeWall, part_GantryTube.y + 1, part_GantryTube.z - 2*dim_GantryTubeWall]);
		
		// length holes
		for(offset = [0:6]){
			translate([part_GantryTube.x * -0.5 - 0.5, (part_GantryTube.y * - 0.5) + dim_GantryTubeHoleZEndY + (offset * dim_GantryTubeHoleZOffsetY) , dim_GantryTubeHoleOffsetZ])rotate([0,90,0])cylinder(r = rad_GantryTubeHoleZ, h = part_GantryTube.x + 1);
		}
		
		// off center hole
		translate([ part_GantryTube.x * -0.5 + dim_GantryTubeTopHoleOffsetX, part_GantryTube.y * -0.5 + dim_GantryTubeTopHoleOffsetY, -0.5])cylinder(r = rad_GantryTubeTopHole, h = part_GantryTube.z + 1);
		
		
		// top left mounting hole
		translate([ part_GantryTube.x * -0.5 + dim_GantryTubeMountHoleOffsetX, part_GantryTube.y * -0.5 + dim_GantryTubeMountHoleOffsetY, -0.5]){
			cylinder(r = rad_GantryTubeMountHole, h = part_GantryTube.z + 1);
			translate([rad_GantryTubeMountHole * -1, rad_GantryTubeMountHole  * -4, 0])cube([ rad_GantryTubeMountHole * 2, rad_GantryTubeMountHole * 4, part_GantryTube.z + 1]); 
		}

		// bottom left mounting hole
		translate([ part_GantryTube.x * 0.5 - dim_GantryTubeMountHoleOffsetX, part_GantryTube.y * -0.5 + dim_GantryTubeMountHoleOffsetY, -0.5]){
			cylinder(r = rad_GantryTubeMountHole, h = part_GantryTube.z + 1);
			translate([rad_GantryTubeMountHole * -1, rad_GantryTubeMountHole  * -4, 0])cube([ rad_GantryTubeMountHole * 2, rad_GantryTubeMountHole * 4, part_GantryTube.z + 1]); 
		}
		
		// top right mounting hole
		translate([ part_GantryTube.x * -0.5 + dim_GantryTubeMountHoleOffsetX, part_GantryTube.y * 0.5 - dim_GantryTubeMountHoleOffsetY, -0.5]){
			cylinder(r = rad_GantryTubeMountHole, h = part_GantryTube.z + 1);
			translate([rad_GantryTubeMountHole * -1, 0, 0])cube([ rad_GantryTubeMountHole * 2, rad_GantryTubeMountHole * 4, part_GantryTube.z + 1]); 
		}
		
		// bottom right mounting hole
		translate([ part_GantryTube.x * 0.5 - dim_GantryTubeMountHoleOffsetX, part_GantryTube.y * 0.5 - dim_GantryTubeMountHoleOffsetY, -0.5]){
			cylinder(r = rad_GantryTubeMountHole, h = part_GantryTube.z + 1);
			translate([rad_GantryTubeMountHole * -1, 0, 0])cube([ rad_GantryTubeMountHole * 2, rad_GantryTubeMountHole * 4, part_GantryTube.z + 1]); 
		}
		
		// adjacent left hole
		translate([ part_GantryTube.x * 0.5 - dim_GantryTubeAdjacentHoleOffsetX, part_GantryTube.y * -0.5 + dim_GantryTubeAdjacentHoleOffsetY, part_GantryTube.z * 0.5 ]){
			cylinder(r = rad_GantryTubeAdjacentHole, h = part_GantryTube.z);
			translate([ rad_GantryTubeAdjacentHole * -1, rad_GantryTubeAdjacentHole * -4, 0])cube([ rad_GantryTubeAdjacentHole * 2, rad_GantryTubeAdjacentHole * 4, part_GantryTube.z]);
		}
	}
}
